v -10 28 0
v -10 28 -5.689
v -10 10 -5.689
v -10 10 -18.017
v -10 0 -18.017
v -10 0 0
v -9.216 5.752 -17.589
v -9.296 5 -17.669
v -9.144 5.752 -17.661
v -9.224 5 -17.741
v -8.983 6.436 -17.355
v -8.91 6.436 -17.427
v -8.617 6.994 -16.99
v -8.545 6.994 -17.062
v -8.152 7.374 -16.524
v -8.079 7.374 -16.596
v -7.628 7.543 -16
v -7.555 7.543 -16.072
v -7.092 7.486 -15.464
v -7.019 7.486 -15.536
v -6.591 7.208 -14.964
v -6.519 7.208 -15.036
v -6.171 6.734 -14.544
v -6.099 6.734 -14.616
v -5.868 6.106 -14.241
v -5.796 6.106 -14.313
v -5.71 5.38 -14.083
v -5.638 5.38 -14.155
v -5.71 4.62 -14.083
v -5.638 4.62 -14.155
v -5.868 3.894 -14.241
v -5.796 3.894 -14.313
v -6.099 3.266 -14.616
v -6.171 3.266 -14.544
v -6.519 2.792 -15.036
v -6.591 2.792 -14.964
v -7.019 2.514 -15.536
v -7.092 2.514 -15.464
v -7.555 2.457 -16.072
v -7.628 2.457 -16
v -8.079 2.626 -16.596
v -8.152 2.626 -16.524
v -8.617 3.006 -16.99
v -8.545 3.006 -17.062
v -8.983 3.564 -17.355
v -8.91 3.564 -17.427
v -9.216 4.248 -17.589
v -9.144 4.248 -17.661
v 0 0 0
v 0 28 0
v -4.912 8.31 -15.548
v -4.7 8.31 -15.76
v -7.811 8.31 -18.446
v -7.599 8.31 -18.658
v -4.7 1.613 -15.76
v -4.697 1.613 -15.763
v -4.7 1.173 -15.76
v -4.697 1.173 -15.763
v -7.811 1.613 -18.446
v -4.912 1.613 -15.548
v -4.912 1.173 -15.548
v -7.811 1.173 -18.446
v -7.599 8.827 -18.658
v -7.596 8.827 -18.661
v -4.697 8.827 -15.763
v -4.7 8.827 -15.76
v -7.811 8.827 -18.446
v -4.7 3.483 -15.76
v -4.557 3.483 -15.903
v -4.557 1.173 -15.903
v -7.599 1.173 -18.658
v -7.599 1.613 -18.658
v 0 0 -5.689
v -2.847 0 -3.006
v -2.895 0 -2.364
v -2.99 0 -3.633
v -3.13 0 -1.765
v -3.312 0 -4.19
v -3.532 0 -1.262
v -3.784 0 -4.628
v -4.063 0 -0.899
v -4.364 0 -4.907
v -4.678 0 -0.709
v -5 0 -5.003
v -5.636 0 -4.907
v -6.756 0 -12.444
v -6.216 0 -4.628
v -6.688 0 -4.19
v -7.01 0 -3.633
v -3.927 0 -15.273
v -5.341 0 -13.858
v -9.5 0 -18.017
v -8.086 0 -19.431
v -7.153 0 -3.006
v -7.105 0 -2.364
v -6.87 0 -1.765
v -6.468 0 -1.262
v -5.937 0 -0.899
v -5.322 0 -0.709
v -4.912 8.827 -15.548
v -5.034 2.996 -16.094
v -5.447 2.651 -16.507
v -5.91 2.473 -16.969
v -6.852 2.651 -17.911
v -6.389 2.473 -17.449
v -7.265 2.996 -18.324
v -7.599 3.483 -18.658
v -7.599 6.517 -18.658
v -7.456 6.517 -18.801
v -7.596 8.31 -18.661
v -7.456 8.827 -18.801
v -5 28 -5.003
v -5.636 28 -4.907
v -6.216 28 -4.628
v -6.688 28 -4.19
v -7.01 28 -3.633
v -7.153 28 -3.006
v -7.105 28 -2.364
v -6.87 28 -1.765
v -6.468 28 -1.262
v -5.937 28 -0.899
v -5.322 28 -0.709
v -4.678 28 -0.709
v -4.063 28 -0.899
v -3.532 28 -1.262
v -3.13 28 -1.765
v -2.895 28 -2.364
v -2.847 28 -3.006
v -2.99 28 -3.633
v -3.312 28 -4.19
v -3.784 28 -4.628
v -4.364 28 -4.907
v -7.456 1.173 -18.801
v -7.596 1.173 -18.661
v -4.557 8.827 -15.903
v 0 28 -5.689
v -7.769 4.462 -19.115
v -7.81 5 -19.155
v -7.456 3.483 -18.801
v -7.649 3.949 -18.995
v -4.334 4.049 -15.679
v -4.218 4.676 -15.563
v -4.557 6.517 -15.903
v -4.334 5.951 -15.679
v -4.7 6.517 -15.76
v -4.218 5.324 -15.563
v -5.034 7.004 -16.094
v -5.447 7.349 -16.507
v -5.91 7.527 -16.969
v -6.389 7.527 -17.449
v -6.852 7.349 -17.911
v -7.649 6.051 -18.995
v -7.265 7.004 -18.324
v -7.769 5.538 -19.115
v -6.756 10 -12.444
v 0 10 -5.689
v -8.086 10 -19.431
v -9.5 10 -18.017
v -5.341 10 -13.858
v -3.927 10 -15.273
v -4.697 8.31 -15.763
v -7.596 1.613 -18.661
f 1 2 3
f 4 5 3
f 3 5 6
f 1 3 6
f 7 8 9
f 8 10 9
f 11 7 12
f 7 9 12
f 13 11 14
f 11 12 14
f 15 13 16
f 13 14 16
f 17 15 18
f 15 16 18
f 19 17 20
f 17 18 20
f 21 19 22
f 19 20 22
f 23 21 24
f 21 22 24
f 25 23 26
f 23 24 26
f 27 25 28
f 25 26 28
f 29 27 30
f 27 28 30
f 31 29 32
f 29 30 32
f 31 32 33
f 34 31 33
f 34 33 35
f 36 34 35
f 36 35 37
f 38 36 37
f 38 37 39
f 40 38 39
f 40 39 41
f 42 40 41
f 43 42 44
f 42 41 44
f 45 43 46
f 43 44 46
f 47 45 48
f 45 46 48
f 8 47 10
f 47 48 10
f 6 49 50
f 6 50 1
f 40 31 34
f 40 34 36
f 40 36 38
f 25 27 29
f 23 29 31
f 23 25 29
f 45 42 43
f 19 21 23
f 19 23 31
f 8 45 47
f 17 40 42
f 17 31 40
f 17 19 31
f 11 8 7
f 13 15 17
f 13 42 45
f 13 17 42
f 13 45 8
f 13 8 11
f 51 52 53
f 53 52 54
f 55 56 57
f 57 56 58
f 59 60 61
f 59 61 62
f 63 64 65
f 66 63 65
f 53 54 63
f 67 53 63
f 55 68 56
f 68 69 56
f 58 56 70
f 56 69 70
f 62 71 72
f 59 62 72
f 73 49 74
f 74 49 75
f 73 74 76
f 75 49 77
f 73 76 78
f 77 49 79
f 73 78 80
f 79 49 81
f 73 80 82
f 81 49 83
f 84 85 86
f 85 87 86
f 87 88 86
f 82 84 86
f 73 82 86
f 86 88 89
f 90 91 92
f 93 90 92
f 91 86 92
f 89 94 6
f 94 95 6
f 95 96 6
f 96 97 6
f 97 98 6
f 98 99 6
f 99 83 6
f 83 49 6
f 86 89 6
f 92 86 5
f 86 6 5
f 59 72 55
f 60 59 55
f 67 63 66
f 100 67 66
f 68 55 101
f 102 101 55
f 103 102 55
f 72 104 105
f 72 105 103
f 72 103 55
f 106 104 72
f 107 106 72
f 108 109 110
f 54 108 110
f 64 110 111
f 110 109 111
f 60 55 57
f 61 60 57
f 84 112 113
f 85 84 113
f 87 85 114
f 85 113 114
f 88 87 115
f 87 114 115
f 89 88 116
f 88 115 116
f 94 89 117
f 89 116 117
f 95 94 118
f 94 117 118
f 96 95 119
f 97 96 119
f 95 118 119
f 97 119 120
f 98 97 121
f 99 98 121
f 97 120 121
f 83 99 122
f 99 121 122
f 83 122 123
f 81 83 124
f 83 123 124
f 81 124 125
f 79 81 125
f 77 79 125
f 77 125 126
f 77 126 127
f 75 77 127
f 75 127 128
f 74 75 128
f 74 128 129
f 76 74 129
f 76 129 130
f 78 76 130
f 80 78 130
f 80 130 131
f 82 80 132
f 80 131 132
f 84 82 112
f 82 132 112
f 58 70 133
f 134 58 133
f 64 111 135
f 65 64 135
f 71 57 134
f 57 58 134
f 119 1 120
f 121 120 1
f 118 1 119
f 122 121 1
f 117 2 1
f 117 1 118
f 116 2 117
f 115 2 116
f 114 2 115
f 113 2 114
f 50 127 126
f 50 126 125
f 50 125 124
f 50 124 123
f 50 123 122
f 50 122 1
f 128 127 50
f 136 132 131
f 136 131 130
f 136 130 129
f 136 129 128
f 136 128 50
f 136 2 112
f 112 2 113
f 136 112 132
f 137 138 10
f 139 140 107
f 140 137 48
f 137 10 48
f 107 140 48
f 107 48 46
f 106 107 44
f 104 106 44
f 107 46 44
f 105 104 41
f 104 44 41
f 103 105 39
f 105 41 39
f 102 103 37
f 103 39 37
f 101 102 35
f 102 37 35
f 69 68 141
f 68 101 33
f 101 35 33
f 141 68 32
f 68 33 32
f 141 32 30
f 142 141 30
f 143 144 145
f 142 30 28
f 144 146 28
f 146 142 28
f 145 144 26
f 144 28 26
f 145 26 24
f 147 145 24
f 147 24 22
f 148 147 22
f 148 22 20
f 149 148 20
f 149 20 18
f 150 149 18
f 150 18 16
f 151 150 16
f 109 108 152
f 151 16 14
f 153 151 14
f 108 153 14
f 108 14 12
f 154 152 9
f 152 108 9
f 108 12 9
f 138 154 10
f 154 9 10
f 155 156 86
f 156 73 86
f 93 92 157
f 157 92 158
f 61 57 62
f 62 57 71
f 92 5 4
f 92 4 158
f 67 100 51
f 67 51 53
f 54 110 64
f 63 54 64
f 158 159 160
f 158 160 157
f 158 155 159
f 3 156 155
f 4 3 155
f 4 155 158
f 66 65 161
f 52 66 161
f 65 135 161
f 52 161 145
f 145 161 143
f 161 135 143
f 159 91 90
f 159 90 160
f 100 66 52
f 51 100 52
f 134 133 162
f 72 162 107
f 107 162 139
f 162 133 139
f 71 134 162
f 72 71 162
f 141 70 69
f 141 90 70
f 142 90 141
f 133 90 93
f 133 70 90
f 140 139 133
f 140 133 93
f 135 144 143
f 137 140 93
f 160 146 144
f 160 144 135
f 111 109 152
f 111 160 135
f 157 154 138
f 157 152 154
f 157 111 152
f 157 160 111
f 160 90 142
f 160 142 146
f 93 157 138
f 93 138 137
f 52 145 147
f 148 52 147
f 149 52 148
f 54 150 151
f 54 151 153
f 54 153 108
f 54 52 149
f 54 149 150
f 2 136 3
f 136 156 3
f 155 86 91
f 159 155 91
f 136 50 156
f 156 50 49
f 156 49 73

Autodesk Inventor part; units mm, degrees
ref_plane "YZ Plane" through (0, 0, 0) normal (1, 0, 0) x (0, 1, 0)
ref_plane "XZ Plane" through (0, 0, 0) normal (0, 1, 0) x (-1, 0, 0)
ref_plane "XY Plane" through (0, 0, 0) normal (0, 0, 1) x (1, 0, 0)
sketch "Sketch1" plane through (0, 0, 0) normal (0, 1, 0) x (-1, 0, 0)
  line L0 (0, -5.6886) -> (6.7556, -12.4442)
  line L1 (6.7556, -12.4442) -> (5.3414, -13.8584)
  line L2 (9.5, -18.017) -> (5.3414, -13.8584)
  line L3 (10, -18.017) -> (9.5, -18.017)
  line L4 (10, -18.017) -> (10, 0)
  line L5 (0, 0) -> (10, 0)
  line L6 (0, 0) -> (0, -5.6886)
  circle A0 centre (5, -2.8443) radius 1.339
extrude "Extrusion1" add sketch "Sketch1" along normal blind 10
sketch "Sketch2" plane through (0, 10, 0) normal (0, 1, 0) x (1, 0, 0)
  line L0 (0, 5.6886) -> (-10, 5.6886)
  line L1 (-10, 5.6886) -> (-10, 0)
  line L2 (-10, 0) -> (0, 0)
  line L3 (0, 0) -> (0, 5.6886)
extrude "Extrusion2" add sketch "Sketch2" along normal blind 20
sketch "Sketch3" plane through (0, 0, 0) normal (0, -1, 0) x (1, 0, 0)
  circle A0 centre (-5, -2.8443) radius 1.339 projected
hole "Hole1" at (-5, 0, -2.8443) direction (0, 1, 0) diameter 4.318 depth 31 tip angle 118
sketch "Sketch4" plane through (-9.5, 0, -18.017) normal (0.7071, 0, -0.7071) x (-0.7071, 0, -0.7071)
  circle A0 centre (-2.9406, 5) radius 2.55
  point P0 (-19.4575, 0)
  dimension "d11" = 5.1
extrude "Extrusion3" cut sketch "Sketch4" against normal blind 0.1
sketch "Sketch6" plane through (-9.5, 0, -18.017) normal (0.7071, 0, -0.7071) x (-0.7071, 0, -0.7071)
  circle A0 centre (-2.9406, 5) radius 2.55 projected
  line L0 (-5.8811, 0) -> (0, 0) projected
  line L1 (0, 0) -> (0, 10) projected
  line L2 (-5.8811, 10) -> (0, 10) projected
  line L3 (-5.8811, 0) -> (-5.8811, 10) projected
  point P0 (-19.4575, 0)
sketch "Sketch8" plane through (0, 30, 0) normal (0, 1, 0) x (1, 0, 0)
  circle A0 centre (-5, 2.8443) radius 2.159 projected
  line L0 (0, 5.6886) -> (-10, 5.6886) projected
  line L1 (-10, 5.6886) -> (-10, 0) projected
  line L2 (-10, 0) -> (0, 0) projected
  line L3 (0, 0) -> (0, 5.6886) projected
extrude "Extrusion5" cut sketch "Sketch8" against normal blind 2
extrude "Extrusion6" add sketch "Sketch6" along normal blind 2
sketch "Sketch9" plane through (-8.0858, 0, -19.4312) normal (0.7071, 0, -0.7071) x (-0.7071, 0, -0.7071)
  line L0 (-4.9902, 1.1733) -> (-0.8909, 1.1733)
  line L1 (-0.8909, 1.1733) -> (-0.8909, 8.8267)
  line L2 (-0.8909, 8.8267) -> (-4.9902, 8.8267)
  line L3 (-4.9902, 8.8267) -> (-4.9902, 1.1733)
  line L4 (-4.9902, 1.1733) -> (-0.8909, 8.8267) construction
  line L5 (-0.8909, 1.1733) -> (-4.9902, 8.8267) construction
  point P0 (-19.4575, 0)
  point P1 (-2.9406, 5)
extrude "Extrusion7" cut sketch "Sketch9" against normal blind 0.2
sketch "Sketch10" plane through (-8.2272, 0, -19.2898) normal (0.7071, 0, -0.7071) x (-0.7071, 0, -0.7071)
  line L0 (-4.9902, 8.3098) -> (-0.8909, 8.3098)
  line L1 (-0.8909, 8.3098) -> (-0.8909, 8.8267)
  line L2 (-0.8909, 8.8267) -> (-4.9902, 8.8267)
  line L3 (-4.9902, 8.8267) -> (-4.9902, 8.3098)
  point P0 (-19.4575, 0)
extrude "Extrusion8" cut sketch "Sketch10" against normal blind 0.3
sketch "Sketch11" plane through (-8.2272, 0, -19.2898) normal (0.7071, 0, -0.7071) x (-0.7071, 0, -0.7071)
  line L0 (-4.9902, 1.1733) -> (-0.8909, 1.1733)
  line L1 (-0.8909, 1.1733) -> (-0.8909, 1.613)
  line L2 (-0.8909, 1.613) -> (-4.9902, 1.613)
  line L3 (-4.9902, 1.613) -> (-4.9902, 1.1733)
  point P0 (-19.4575, 0)
extrude "Extrusion9" cut sketch "Sketch11" against normal blind 0.3
properties part number "sampleHolder_v3"
